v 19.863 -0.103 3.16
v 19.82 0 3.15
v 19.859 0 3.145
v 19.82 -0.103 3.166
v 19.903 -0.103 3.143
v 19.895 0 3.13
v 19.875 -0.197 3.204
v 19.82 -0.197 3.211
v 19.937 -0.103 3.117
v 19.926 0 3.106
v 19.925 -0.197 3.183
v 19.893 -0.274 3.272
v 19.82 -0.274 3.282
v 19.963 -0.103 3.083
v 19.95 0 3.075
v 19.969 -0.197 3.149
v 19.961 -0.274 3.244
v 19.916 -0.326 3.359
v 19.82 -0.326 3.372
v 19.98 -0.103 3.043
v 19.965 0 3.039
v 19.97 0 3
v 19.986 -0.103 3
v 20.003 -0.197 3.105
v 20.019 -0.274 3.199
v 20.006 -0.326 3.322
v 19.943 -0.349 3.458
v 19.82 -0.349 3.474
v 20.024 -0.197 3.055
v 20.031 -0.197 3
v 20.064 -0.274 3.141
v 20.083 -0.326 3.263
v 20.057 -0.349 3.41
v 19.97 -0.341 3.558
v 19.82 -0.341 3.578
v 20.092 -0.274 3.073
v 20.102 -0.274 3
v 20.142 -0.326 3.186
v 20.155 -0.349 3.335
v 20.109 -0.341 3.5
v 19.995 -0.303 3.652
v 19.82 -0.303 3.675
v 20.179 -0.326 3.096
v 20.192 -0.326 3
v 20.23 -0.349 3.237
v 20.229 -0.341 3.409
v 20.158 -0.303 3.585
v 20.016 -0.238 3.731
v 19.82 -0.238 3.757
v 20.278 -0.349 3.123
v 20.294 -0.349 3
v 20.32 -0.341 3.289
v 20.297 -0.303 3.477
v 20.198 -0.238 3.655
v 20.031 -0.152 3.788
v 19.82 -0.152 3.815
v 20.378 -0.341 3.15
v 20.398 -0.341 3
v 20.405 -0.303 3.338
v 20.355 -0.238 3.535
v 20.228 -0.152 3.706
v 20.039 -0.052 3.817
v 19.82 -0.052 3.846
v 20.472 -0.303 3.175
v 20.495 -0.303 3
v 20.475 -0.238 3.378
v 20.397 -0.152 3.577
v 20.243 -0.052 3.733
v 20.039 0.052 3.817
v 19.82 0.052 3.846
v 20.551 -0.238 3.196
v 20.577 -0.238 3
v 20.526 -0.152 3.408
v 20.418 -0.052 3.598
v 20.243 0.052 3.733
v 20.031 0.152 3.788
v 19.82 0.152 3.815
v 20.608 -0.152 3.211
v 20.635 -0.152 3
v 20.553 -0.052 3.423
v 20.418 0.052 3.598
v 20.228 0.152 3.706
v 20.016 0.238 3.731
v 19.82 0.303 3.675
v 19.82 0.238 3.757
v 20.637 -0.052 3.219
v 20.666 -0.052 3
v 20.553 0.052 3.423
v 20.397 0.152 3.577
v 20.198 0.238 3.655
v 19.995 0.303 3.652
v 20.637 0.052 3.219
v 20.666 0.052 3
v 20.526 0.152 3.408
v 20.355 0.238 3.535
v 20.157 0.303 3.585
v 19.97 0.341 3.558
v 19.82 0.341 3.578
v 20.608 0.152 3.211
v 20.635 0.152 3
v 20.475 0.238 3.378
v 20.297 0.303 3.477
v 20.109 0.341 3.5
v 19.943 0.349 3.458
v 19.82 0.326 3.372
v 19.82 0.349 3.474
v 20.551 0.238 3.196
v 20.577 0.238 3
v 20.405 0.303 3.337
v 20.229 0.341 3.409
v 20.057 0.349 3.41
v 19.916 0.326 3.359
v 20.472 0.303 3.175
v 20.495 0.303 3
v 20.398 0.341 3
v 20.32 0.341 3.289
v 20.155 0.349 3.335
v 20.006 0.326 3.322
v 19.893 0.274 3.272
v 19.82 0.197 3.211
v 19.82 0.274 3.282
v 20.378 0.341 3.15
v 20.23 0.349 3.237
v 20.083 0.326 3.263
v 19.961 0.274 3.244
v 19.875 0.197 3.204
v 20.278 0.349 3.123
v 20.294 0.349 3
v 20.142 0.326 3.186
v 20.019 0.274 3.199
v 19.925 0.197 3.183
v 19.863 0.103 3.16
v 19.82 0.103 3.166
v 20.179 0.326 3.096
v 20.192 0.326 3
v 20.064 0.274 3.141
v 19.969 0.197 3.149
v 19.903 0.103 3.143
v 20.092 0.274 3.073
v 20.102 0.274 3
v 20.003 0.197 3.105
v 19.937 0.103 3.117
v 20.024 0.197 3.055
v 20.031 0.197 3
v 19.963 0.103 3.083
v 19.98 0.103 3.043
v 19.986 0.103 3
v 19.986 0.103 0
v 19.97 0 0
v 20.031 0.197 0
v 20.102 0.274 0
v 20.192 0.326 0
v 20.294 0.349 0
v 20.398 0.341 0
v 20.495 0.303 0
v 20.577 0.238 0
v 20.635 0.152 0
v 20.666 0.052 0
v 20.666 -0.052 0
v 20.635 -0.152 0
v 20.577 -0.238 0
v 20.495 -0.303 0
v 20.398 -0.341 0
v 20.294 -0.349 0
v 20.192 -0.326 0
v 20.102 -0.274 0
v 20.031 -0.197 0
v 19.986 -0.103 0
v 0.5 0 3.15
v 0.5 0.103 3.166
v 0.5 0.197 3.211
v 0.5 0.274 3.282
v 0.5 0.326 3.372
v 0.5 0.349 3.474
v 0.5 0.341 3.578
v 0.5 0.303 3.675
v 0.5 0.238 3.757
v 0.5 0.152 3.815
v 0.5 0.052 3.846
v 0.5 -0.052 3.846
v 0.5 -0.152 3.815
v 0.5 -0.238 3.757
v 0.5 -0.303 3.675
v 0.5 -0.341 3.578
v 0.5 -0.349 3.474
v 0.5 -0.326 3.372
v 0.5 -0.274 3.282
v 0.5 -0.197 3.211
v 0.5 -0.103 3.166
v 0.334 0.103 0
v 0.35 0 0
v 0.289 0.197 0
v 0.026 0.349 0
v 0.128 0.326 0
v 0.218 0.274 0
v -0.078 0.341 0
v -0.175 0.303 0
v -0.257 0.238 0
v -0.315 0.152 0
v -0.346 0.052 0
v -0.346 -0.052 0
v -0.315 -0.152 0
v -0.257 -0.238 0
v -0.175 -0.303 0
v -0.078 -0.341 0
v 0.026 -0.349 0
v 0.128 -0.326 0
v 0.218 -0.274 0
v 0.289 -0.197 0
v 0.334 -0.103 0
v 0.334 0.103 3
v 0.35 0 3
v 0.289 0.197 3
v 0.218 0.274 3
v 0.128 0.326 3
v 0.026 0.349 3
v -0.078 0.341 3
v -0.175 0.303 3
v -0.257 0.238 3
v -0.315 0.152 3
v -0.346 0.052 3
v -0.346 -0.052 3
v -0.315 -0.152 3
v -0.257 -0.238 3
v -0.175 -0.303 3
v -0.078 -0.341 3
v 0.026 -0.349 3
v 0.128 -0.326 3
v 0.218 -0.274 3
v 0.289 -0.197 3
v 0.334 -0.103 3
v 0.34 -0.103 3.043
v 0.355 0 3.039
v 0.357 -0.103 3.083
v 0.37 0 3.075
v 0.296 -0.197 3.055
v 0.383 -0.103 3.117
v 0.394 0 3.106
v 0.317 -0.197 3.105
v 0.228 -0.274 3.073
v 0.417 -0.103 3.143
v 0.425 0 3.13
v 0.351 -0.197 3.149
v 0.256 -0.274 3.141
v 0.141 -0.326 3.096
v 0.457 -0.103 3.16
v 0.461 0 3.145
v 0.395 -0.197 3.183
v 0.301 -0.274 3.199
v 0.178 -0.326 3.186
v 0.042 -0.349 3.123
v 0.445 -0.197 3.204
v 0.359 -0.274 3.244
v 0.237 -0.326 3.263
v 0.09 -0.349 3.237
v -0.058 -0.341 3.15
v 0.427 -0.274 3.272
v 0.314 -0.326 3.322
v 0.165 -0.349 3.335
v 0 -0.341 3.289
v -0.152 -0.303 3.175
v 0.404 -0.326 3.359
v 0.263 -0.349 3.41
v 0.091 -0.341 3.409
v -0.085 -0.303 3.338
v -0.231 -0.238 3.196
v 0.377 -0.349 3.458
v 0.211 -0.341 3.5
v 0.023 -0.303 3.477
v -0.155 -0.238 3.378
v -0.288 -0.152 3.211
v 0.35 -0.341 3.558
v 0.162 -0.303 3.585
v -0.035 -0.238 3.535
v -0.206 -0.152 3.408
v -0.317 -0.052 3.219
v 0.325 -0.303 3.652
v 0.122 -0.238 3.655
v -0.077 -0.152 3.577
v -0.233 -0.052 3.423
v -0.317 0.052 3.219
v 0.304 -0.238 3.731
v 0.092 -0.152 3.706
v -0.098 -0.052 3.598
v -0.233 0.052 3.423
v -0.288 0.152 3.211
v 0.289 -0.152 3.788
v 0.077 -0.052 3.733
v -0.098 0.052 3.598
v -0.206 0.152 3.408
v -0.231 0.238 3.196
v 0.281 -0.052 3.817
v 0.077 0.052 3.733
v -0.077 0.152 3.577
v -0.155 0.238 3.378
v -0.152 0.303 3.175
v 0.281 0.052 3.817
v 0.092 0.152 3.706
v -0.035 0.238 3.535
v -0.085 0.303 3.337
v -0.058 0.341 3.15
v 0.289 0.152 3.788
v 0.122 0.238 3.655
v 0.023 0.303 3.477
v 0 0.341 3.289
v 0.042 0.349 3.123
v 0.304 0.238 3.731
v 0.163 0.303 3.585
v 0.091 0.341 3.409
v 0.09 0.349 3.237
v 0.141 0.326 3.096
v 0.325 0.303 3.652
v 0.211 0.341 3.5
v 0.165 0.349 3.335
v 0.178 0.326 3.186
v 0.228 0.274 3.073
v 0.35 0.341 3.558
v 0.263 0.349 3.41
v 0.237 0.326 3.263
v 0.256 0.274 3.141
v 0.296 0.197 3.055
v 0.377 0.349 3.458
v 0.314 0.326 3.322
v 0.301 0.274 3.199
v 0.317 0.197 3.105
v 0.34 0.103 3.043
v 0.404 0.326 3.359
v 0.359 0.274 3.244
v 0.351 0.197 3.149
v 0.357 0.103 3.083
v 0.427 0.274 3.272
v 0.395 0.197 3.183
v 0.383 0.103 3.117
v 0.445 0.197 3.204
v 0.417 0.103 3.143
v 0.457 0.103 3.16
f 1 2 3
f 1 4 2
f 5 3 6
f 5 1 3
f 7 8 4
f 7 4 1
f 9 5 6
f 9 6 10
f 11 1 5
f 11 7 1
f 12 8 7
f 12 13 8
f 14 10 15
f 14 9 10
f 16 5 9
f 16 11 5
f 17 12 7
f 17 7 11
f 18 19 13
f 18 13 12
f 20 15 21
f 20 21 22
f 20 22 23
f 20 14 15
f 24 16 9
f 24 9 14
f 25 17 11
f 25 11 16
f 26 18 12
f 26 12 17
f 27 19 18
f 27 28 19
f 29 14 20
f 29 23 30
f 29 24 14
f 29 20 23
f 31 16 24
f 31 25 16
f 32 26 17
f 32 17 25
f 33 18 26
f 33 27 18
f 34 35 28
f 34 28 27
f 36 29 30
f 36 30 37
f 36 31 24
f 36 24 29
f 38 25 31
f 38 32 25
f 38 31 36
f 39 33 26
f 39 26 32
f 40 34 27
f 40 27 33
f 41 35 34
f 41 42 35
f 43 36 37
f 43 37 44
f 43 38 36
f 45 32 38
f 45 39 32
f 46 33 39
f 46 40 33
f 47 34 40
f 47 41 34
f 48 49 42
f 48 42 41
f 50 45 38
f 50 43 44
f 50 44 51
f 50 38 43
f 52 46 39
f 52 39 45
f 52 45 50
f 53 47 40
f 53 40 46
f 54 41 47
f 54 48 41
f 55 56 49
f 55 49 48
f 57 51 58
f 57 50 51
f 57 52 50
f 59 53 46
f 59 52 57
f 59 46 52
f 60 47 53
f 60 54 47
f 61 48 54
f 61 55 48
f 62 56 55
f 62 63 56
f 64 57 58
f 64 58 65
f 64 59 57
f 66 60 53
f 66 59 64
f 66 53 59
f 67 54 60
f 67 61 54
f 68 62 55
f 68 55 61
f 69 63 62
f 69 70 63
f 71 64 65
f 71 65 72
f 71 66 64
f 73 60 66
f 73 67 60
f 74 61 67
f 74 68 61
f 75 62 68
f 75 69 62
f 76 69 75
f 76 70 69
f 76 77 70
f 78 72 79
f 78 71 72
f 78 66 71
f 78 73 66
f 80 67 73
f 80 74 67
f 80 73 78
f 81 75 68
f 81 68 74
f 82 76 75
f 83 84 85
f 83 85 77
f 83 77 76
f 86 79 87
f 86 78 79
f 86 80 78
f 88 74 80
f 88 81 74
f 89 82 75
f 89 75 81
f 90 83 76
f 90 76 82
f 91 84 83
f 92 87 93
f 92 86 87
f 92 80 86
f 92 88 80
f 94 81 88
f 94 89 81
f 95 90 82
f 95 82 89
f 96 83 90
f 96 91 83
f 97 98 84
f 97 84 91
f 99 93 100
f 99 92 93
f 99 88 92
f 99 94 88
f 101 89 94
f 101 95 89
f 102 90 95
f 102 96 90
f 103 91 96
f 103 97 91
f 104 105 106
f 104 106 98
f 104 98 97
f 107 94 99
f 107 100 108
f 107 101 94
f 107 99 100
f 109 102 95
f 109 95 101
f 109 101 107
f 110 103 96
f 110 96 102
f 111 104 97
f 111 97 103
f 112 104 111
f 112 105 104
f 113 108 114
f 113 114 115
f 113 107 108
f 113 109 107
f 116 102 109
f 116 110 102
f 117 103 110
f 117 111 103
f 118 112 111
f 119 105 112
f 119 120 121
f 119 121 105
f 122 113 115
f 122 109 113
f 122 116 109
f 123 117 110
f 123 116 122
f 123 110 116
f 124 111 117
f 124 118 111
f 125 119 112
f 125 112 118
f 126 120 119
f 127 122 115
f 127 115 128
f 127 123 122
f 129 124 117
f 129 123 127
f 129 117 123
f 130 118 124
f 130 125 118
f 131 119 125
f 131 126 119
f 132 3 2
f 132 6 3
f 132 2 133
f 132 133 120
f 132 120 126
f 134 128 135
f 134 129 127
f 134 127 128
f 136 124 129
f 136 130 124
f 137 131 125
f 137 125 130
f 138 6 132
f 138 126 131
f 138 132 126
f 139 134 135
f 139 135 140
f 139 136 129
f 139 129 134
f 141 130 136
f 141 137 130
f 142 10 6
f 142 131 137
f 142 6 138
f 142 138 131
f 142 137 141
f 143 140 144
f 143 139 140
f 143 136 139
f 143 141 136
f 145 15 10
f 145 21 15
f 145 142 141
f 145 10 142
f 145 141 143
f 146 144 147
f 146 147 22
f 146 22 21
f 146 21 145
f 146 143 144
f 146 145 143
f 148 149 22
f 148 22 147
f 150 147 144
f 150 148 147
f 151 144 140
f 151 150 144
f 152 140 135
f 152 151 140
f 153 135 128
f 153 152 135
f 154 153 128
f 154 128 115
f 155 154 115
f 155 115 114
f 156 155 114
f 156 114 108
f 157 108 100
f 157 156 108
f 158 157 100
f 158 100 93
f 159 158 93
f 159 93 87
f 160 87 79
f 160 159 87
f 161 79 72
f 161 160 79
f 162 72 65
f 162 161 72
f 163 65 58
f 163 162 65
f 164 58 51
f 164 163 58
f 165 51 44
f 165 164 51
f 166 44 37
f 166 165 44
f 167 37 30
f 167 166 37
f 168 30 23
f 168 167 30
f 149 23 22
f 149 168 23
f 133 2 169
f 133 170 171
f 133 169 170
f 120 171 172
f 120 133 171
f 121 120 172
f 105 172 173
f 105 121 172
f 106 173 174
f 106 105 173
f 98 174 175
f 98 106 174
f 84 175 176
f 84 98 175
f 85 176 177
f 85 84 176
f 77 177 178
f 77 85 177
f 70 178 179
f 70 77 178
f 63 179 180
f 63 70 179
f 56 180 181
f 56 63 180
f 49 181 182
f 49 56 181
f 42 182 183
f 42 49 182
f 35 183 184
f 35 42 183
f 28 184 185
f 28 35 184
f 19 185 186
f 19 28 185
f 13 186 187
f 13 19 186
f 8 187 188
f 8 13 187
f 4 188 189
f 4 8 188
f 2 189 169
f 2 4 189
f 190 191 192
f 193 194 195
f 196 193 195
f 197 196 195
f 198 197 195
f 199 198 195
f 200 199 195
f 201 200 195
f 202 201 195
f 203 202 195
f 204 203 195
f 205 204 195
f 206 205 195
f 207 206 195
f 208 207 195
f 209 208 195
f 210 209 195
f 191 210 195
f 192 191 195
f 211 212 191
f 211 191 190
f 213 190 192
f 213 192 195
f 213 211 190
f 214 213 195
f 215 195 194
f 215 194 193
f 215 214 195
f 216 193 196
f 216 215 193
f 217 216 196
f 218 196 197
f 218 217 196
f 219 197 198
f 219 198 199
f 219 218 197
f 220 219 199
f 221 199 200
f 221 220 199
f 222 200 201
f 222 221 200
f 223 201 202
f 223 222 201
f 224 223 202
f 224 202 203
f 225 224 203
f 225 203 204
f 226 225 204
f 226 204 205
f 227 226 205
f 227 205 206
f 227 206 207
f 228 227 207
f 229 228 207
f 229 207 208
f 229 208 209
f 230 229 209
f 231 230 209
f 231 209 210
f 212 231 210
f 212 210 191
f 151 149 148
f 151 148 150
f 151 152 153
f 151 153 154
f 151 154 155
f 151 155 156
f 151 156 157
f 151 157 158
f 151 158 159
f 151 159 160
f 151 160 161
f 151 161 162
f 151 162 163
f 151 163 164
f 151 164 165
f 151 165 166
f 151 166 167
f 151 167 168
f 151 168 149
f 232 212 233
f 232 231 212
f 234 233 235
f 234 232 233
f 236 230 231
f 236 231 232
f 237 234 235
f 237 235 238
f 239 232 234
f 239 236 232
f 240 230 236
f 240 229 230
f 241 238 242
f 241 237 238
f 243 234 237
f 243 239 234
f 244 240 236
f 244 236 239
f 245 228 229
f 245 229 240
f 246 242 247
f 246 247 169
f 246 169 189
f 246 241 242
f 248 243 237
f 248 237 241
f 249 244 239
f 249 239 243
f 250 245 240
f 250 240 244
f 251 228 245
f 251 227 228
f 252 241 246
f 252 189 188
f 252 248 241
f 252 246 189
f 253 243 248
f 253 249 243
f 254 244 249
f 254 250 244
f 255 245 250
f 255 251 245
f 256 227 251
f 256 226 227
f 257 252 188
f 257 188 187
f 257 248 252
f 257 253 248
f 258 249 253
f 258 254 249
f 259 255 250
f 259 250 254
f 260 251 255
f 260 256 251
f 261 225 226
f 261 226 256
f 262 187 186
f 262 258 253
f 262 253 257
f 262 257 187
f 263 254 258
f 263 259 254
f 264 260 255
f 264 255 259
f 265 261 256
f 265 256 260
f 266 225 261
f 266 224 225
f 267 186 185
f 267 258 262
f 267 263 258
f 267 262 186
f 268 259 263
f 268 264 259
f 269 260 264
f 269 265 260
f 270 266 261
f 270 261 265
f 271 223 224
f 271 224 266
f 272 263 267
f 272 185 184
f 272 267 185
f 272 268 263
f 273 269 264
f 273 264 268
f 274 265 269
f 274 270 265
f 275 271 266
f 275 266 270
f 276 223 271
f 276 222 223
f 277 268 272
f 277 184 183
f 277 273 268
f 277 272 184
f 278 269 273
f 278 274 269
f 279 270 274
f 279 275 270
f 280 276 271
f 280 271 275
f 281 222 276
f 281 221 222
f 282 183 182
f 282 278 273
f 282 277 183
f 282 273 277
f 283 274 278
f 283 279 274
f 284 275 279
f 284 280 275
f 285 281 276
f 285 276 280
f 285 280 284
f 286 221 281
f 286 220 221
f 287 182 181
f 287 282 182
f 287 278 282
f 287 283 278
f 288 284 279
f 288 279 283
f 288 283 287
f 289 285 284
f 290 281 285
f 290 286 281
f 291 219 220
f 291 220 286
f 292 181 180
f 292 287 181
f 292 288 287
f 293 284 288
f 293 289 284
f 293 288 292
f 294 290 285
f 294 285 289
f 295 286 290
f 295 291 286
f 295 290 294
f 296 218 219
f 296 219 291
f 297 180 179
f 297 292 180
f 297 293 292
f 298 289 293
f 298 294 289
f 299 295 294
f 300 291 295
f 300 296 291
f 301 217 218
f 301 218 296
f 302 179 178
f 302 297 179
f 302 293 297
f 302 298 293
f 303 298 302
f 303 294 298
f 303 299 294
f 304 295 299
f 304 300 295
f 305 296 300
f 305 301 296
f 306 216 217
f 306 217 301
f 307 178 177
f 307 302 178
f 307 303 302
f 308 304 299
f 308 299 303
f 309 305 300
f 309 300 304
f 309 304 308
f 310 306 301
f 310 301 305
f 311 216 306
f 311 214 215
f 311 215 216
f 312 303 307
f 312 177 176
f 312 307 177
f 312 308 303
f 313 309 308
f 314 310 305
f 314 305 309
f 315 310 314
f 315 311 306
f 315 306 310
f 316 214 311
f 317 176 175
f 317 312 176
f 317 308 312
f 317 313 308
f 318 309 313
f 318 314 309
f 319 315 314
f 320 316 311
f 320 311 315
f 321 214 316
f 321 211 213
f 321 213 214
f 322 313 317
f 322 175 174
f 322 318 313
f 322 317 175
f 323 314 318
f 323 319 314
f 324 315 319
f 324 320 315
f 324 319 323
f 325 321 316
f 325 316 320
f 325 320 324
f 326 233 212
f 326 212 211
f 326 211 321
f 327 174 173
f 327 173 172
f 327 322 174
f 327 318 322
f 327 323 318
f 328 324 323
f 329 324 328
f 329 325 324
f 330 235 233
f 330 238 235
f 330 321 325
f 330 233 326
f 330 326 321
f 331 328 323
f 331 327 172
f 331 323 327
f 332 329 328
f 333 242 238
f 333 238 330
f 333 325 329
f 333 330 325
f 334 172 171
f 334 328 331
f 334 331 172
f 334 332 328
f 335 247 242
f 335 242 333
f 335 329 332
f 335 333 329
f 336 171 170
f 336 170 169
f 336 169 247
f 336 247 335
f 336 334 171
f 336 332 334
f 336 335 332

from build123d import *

# Parameters (mm, degrees)
SKETCH001_R = 0.35


with BuildPart() as part:
    # AdditivePipe: sweep along a path in Sketch
    with BuildLine(Plane.XZ) as additivepipe_path:
        Line((0, 0), (0, 3))
        ThreePointArc((0, 3), (0.146447, 3.353553), (0.5, 3.5))
        Line((0.5, 3.5), (19.82, 3.5))
        ThreePointArc((19.82, 3.5), (20.173553, 3.353553), (20.32, 3))
        Line((20.32, 3), (20.32, 0))
    # Sketch001 → AdditivePipe (sweep)
    with BuildSketch(Plane.XY):
        Circle(SKETCH001_R)
    sweep(path=additivepipe_path.line)


solid = part.part
